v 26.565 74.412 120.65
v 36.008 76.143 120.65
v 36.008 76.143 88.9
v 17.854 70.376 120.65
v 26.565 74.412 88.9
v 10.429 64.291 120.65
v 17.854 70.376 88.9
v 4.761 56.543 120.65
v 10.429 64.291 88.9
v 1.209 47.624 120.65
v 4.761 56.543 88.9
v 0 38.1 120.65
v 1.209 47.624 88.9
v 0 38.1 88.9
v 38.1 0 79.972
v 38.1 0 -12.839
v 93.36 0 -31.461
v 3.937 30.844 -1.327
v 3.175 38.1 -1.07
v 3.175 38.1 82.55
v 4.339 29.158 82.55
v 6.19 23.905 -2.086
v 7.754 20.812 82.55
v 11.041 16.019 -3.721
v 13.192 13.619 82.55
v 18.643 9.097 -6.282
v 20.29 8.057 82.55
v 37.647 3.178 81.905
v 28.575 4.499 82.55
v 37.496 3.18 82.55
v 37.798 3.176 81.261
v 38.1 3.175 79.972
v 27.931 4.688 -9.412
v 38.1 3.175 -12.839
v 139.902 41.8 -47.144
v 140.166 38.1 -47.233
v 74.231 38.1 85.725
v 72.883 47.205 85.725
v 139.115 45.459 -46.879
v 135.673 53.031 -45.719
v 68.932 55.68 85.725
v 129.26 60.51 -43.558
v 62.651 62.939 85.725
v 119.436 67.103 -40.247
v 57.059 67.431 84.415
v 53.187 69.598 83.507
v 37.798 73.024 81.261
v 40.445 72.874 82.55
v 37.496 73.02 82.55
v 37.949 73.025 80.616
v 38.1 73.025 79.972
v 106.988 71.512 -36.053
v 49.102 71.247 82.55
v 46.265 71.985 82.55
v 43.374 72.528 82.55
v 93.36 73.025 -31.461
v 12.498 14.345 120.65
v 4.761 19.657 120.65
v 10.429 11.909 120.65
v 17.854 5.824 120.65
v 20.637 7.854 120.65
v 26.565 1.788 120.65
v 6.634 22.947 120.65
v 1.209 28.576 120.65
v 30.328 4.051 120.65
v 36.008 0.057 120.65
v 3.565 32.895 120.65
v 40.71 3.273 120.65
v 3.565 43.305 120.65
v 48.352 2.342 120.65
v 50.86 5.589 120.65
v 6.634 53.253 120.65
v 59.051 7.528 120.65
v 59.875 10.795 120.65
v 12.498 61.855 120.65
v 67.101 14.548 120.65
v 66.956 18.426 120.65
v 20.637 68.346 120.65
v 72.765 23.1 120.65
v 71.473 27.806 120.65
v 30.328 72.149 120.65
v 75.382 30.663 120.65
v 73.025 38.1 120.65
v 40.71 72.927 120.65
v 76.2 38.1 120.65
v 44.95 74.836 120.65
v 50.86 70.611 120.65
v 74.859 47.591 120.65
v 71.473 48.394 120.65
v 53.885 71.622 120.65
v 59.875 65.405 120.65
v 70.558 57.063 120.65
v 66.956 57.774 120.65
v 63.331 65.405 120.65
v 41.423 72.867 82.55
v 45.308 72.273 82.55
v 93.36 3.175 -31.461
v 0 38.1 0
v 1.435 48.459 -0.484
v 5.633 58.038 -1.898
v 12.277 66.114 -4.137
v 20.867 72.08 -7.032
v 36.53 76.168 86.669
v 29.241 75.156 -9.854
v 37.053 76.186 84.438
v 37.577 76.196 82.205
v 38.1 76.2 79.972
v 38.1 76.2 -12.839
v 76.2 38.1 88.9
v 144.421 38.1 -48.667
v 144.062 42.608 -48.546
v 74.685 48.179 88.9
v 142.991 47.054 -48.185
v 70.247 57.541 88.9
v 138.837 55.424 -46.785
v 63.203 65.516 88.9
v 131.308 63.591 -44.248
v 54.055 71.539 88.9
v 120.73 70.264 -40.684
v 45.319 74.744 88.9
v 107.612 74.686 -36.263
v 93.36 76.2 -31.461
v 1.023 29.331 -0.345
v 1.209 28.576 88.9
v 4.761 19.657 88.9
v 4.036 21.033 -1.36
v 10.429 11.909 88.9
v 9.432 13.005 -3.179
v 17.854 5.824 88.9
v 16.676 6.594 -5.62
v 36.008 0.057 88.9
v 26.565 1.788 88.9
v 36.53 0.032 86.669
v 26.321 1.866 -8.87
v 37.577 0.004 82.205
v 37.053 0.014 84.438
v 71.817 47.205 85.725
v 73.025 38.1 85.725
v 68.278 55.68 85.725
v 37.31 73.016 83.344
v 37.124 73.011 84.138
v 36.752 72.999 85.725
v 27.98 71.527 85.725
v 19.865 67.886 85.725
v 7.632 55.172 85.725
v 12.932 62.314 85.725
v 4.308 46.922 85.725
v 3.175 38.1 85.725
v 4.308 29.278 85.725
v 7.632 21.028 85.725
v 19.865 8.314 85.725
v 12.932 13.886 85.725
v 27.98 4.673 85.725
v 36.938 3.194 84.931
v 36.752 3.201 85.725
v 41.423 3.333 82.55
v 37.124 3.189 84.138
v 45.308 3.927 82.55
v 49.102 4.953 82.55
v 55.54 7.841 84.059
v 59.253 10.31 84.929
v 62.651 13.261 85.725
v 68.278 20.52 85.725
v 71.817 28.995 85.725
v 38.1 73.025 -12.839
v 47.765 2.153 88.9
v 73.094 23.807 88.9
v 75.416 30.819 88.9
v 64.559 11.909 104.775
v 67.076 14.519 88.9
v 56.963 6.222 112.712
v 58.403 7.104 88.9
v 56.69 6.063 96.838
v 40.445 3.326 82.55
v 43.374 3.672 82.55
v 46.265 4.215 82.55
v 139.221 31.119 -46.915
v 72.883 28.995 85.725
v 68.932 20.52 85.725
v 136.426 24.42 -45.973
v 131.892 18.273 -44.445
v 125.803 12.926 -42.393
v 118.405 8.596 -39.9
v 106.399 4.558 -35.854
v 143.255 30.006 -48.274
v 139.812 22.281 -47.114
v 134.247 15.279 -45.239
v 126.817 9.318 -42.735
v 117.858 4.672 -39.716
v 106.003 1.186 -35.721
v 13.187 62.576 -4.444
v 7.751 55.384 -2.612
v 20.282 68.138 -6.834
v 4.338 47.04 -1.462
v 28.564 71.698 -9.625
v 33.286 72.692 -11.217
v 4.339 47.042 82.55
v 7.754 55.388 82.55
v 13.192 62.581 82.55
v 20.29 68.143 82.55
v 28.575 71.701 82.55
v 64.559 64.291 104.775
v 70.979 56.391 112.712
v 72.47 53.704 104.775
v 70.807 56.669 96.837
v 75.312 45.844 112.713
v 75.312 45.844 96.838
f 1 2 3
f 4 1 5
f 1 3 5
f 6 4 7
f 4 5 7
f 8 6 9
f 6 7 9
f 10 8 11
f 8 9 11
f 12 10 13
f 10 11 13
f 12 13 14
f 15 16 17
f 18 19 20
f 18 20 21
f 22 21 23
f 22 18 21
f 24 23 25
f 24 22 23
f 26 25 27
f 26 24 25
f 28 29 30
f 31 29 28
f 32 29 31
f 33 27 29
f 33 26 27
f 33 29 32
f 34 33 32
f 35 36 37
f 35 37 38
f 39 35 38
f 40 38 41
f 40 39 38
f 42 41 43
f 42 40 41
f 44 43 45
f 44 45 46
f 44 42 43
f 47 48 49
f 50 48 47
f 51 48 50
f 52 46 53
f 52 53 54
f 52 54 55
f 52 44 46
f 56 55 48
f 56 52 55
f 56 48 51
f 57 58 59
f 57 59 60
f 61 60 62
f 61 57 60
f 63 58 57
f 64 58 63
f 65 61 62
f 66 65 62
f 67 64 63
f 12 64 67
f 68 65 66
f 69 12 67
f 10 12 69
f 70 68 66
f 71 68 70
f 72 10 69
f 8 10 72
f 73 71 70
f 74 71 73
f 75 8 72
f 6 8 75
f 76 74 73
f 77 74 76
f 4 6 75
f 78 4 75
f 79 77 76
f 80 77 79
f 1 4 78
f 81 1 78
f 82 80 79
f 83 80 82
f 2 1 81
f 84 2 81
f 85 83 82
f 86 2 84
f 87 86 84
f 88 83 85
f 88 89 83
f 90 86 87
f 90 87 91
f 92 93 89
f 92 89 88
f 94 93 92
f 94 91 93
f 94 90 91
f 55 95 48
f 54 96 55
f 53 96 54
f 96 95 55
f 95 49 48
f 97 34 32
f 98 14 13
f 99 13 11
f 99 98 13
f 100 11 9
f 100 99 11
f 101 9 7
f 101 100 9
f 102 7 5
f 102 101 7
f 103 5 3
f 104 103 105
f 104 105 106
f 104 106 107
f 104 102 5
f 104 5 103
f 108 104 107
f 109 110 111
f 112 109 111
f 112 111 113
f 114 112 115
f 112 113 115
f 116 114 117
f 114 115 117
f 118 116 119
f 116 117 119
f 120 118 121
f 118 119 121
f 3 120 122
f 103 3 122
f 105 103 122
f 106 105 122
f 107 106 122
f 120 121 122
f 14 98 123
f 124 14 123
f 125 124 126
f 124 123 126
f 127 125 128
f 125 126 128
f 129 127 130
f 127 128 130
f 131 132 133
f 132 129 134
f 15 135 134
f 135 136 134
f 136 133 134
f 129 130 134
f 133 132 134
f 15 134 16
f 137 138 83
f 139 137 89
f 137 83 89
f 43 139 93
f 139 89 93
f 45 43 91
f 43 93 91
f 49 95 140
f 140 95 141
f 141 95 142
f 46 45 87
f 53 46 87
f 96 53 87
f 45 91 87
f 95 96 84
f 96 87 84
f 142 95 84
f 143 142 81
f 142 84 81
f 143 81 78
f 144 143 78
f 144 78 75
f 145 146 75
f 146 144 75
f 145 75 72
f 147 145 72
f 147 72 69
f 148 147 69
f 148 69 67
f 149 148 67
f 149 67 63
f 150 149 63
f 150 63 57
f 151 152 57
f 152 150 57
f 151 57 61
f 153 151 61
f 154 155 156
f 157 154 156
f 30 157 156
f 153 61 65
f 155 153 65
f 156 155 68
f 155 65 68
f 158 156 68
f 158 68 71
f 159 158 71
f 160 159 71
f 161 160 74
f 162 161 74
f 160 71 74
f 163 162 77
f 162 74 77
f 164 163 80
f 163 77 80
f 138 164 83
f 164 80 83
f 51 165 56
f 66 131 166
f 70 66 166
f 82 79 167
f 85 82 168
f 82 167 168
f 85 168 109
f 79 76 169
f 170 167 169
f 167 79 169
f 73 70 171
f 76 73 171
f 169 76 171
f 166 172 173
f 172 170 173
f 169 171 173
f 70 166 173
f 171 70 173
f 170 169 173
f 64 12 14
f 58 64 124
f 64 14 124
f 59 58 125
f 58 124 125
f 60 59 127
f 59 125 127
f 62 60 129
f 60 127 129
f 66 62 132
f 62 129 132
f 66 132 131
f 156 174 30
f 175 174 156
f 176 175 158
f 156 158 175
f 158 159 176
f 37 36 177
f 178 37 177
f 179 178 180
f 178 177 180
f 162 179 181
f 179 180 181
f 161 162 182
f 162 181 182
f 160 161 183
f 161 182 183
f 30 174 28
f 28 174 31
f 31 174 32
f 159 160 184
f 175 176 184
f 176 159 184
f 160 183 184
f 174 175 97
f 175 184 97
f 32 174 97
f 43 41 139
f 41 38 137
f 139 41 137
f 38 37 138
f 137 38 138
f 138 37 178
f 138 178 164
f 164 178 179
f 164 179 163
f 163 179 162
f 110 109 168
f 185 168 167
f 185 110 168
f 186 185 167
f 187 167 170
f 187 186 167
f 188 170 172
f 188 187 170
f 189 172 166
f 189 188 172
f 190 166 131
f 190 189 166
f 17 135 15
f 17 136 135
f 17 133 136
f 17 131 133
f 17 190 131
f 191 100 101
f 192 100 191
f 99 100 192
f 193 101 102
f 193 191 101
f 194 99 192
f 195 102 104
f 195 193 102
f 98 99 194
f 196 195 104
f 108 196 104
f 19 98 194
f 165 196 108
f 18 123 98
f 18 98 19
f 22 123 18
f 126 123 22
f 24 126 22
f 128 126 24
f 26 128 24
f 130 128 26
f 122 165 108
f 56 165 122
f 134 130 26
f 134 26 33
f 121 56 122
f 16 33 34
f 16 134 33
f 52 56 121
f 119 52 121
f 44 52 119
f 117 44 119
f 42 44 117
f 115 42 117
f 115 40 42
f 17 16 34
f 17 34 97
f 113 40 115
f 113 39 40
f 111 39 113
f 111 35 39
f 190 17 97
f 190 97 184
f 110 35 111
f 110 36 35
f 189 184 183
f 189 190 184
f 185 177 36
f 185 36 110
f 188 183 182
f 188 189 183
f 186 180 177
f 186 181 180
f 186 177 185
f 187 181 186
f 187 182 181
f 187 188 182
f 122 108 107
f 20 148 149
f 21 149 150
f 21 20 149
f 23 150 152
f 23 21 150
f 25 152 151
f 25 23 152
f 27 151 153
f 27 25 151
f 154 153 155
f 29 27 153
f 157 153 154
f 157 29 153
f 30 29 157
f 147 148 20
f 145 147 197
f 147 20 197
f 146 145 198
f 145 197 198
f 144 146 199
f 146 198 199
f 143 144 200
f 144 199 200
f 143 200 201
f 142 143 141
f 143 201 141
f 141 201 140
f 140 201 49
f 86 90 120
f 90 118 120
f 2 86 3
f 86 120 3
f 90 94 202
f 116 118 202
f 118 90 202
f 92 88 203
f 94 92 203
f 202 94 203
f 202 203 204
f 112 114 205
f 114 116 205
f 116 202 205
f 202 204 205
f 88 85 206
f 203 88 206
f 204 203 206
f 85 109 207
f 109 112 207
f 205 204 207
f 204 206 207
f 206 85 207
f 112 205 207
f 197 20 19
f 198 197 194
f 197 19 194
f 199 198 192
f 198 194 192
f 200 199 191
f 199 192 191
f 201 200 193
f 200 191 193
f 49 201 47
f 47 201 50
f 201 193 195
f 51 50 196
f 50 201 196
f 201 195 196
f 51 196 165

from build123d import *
from build123d import SkipClean  # not in build123d's __all__

# Parameters (mm, degrees)
F1_DEPTH    = 76.2
F2_T1_DEPTH = 279.4
F2_T3_DEPTH = 344.0535746512
F3_T        = -3.175
F5_DEPTH    = 31.75
F6_R        = 34.925
F7_DEPTH    = 38.1


# Not quite as in the source:
# - a fillet or chamfer that OpenCascade refuses, or shapes differently, is made with other operations: its cross-section is extruded or revolved along the edge and cut away or added


with BuildPart() as f1:
    # F0 (on Front) → F1 (new body)
    with BuildSketch(Plane.XZ):
        Polygon((144.4205327875, -48.6669262372), (76.2, 88.9), (0, 88.9), (0, 0), align=None)
    extrude(amount=-F1_DEPTH)

    # F2: fillet of radius 38.1 on 4 edges, made by hand

    # F2_s2 → F2_t1 (cut)
    with BuildSketch(Plane.XY.offset(-95.25)):
        with BuildLine():
            ThreePointArc((0, 38.1), (11.1592316368, 11.1592316368), (38.1, 0))
            Line((38.1, 0), (0, 0))
            Line((0, 0), (0, 38.1))
        make_face()
        with BuildLine():
            ThreePointArc((0, 38.1), (11.1592316368, 65.0407683632), (38.1, 76.2))
            Line((38.1, 76.2), (0, 76.2))
            Line((0, 76.2), (0, 38.1))
        make_face()
    extrude(amount=F2_T1_DEPTH, mode=Mode.SUBTRACT)

    # F2_s4 → F2_t3 (cut)
    with BuildSketch(Plane(origin=(90.1943185968, 0, -181.8771367864), x_dir=(0, 1, 0), z_dir=(-0.4442783761, 0, 0.8958887903))):
        with BuildLine():
            ThreePointArc((38.1, -107.7630734528), (65.0407683632, -96.603841816), (76.2, -69.6630734528))
            Line((76.2, -69.6630734528), (76.2, -107.7630734528))
            Line((76.2, -107.7630734528), (38.1, -107.7630734528))
        make_face()
        with BuildLine():
            ThreePointArc((38.1, -107.7630734528), (11.1592316368, -96.603841816), (0, -69.6630734528))
            Line((0, -69.6630734528), (0, -107.7630734528))
            Line((0, -107.7630734528), (38.1, -107.7630734528))
        make_face()
    extrude(amount=F2_T3_DEPTH, mode=Mode.SUBTRACT)

    # F3
    f3_openings = [f1.faces().sort_by_distance(p)[0] for p in [
        (71.049342, 38.1, -23.942254),
    ]]
    offset(amount=F3_T, openings=f3_openings)

    # F4 (on face) → F5 (join)
    with BuildSketch(Plane.XY.offset(88.9)):
        with BuildLine():
            add(Edge.make_bspline(
                [(36.0077691103, 0.0574899631), (76.1999999999, 2.0378158336), (76.2, 38.1)],
                knots=[4.7673308141, 4.7673308141, 4.7673308141, 6.2831853072, 6.2831853072, 6.2831853072], degree=2, weights=[1, 0.726262417, 1]))
            add(Edge.make_bspline(
                [(76.2, 38.1), (76.1999999999, 74.1621841664), (36.0077691103, 76.1425100369)],
                knots=[0, 0, 0, 1.5158544931, 1.5158544931, 1.5158544931], degree=2, weights=[1, 0.726262417, 1]))
            ThreePointArc((36.0077691103, 76.1425100369), (10.4294019138, 64.2906090336), (0, 38.1))
            ThreePointArc((0, 38.1), (10.4294019138, 11.9093909664), (36.0077691103, 0.0574899631))
        make_face()
    extrude(amount=F5_DEPTH)

    # F6 (on face) → F7 (cut)
    with BuildSketch(Plane.XY.offset(120.65)):
        with Locations((38.1, 38.1)):
            Circle(F6_R)
    with SkipClean():  # cleaning this boolean's faces spoils the solid; the shape is the same uncleaned
        extrude(amount=-F7_DEPTH, mode=Mode.SUBTRACT)


solid = f1.part
